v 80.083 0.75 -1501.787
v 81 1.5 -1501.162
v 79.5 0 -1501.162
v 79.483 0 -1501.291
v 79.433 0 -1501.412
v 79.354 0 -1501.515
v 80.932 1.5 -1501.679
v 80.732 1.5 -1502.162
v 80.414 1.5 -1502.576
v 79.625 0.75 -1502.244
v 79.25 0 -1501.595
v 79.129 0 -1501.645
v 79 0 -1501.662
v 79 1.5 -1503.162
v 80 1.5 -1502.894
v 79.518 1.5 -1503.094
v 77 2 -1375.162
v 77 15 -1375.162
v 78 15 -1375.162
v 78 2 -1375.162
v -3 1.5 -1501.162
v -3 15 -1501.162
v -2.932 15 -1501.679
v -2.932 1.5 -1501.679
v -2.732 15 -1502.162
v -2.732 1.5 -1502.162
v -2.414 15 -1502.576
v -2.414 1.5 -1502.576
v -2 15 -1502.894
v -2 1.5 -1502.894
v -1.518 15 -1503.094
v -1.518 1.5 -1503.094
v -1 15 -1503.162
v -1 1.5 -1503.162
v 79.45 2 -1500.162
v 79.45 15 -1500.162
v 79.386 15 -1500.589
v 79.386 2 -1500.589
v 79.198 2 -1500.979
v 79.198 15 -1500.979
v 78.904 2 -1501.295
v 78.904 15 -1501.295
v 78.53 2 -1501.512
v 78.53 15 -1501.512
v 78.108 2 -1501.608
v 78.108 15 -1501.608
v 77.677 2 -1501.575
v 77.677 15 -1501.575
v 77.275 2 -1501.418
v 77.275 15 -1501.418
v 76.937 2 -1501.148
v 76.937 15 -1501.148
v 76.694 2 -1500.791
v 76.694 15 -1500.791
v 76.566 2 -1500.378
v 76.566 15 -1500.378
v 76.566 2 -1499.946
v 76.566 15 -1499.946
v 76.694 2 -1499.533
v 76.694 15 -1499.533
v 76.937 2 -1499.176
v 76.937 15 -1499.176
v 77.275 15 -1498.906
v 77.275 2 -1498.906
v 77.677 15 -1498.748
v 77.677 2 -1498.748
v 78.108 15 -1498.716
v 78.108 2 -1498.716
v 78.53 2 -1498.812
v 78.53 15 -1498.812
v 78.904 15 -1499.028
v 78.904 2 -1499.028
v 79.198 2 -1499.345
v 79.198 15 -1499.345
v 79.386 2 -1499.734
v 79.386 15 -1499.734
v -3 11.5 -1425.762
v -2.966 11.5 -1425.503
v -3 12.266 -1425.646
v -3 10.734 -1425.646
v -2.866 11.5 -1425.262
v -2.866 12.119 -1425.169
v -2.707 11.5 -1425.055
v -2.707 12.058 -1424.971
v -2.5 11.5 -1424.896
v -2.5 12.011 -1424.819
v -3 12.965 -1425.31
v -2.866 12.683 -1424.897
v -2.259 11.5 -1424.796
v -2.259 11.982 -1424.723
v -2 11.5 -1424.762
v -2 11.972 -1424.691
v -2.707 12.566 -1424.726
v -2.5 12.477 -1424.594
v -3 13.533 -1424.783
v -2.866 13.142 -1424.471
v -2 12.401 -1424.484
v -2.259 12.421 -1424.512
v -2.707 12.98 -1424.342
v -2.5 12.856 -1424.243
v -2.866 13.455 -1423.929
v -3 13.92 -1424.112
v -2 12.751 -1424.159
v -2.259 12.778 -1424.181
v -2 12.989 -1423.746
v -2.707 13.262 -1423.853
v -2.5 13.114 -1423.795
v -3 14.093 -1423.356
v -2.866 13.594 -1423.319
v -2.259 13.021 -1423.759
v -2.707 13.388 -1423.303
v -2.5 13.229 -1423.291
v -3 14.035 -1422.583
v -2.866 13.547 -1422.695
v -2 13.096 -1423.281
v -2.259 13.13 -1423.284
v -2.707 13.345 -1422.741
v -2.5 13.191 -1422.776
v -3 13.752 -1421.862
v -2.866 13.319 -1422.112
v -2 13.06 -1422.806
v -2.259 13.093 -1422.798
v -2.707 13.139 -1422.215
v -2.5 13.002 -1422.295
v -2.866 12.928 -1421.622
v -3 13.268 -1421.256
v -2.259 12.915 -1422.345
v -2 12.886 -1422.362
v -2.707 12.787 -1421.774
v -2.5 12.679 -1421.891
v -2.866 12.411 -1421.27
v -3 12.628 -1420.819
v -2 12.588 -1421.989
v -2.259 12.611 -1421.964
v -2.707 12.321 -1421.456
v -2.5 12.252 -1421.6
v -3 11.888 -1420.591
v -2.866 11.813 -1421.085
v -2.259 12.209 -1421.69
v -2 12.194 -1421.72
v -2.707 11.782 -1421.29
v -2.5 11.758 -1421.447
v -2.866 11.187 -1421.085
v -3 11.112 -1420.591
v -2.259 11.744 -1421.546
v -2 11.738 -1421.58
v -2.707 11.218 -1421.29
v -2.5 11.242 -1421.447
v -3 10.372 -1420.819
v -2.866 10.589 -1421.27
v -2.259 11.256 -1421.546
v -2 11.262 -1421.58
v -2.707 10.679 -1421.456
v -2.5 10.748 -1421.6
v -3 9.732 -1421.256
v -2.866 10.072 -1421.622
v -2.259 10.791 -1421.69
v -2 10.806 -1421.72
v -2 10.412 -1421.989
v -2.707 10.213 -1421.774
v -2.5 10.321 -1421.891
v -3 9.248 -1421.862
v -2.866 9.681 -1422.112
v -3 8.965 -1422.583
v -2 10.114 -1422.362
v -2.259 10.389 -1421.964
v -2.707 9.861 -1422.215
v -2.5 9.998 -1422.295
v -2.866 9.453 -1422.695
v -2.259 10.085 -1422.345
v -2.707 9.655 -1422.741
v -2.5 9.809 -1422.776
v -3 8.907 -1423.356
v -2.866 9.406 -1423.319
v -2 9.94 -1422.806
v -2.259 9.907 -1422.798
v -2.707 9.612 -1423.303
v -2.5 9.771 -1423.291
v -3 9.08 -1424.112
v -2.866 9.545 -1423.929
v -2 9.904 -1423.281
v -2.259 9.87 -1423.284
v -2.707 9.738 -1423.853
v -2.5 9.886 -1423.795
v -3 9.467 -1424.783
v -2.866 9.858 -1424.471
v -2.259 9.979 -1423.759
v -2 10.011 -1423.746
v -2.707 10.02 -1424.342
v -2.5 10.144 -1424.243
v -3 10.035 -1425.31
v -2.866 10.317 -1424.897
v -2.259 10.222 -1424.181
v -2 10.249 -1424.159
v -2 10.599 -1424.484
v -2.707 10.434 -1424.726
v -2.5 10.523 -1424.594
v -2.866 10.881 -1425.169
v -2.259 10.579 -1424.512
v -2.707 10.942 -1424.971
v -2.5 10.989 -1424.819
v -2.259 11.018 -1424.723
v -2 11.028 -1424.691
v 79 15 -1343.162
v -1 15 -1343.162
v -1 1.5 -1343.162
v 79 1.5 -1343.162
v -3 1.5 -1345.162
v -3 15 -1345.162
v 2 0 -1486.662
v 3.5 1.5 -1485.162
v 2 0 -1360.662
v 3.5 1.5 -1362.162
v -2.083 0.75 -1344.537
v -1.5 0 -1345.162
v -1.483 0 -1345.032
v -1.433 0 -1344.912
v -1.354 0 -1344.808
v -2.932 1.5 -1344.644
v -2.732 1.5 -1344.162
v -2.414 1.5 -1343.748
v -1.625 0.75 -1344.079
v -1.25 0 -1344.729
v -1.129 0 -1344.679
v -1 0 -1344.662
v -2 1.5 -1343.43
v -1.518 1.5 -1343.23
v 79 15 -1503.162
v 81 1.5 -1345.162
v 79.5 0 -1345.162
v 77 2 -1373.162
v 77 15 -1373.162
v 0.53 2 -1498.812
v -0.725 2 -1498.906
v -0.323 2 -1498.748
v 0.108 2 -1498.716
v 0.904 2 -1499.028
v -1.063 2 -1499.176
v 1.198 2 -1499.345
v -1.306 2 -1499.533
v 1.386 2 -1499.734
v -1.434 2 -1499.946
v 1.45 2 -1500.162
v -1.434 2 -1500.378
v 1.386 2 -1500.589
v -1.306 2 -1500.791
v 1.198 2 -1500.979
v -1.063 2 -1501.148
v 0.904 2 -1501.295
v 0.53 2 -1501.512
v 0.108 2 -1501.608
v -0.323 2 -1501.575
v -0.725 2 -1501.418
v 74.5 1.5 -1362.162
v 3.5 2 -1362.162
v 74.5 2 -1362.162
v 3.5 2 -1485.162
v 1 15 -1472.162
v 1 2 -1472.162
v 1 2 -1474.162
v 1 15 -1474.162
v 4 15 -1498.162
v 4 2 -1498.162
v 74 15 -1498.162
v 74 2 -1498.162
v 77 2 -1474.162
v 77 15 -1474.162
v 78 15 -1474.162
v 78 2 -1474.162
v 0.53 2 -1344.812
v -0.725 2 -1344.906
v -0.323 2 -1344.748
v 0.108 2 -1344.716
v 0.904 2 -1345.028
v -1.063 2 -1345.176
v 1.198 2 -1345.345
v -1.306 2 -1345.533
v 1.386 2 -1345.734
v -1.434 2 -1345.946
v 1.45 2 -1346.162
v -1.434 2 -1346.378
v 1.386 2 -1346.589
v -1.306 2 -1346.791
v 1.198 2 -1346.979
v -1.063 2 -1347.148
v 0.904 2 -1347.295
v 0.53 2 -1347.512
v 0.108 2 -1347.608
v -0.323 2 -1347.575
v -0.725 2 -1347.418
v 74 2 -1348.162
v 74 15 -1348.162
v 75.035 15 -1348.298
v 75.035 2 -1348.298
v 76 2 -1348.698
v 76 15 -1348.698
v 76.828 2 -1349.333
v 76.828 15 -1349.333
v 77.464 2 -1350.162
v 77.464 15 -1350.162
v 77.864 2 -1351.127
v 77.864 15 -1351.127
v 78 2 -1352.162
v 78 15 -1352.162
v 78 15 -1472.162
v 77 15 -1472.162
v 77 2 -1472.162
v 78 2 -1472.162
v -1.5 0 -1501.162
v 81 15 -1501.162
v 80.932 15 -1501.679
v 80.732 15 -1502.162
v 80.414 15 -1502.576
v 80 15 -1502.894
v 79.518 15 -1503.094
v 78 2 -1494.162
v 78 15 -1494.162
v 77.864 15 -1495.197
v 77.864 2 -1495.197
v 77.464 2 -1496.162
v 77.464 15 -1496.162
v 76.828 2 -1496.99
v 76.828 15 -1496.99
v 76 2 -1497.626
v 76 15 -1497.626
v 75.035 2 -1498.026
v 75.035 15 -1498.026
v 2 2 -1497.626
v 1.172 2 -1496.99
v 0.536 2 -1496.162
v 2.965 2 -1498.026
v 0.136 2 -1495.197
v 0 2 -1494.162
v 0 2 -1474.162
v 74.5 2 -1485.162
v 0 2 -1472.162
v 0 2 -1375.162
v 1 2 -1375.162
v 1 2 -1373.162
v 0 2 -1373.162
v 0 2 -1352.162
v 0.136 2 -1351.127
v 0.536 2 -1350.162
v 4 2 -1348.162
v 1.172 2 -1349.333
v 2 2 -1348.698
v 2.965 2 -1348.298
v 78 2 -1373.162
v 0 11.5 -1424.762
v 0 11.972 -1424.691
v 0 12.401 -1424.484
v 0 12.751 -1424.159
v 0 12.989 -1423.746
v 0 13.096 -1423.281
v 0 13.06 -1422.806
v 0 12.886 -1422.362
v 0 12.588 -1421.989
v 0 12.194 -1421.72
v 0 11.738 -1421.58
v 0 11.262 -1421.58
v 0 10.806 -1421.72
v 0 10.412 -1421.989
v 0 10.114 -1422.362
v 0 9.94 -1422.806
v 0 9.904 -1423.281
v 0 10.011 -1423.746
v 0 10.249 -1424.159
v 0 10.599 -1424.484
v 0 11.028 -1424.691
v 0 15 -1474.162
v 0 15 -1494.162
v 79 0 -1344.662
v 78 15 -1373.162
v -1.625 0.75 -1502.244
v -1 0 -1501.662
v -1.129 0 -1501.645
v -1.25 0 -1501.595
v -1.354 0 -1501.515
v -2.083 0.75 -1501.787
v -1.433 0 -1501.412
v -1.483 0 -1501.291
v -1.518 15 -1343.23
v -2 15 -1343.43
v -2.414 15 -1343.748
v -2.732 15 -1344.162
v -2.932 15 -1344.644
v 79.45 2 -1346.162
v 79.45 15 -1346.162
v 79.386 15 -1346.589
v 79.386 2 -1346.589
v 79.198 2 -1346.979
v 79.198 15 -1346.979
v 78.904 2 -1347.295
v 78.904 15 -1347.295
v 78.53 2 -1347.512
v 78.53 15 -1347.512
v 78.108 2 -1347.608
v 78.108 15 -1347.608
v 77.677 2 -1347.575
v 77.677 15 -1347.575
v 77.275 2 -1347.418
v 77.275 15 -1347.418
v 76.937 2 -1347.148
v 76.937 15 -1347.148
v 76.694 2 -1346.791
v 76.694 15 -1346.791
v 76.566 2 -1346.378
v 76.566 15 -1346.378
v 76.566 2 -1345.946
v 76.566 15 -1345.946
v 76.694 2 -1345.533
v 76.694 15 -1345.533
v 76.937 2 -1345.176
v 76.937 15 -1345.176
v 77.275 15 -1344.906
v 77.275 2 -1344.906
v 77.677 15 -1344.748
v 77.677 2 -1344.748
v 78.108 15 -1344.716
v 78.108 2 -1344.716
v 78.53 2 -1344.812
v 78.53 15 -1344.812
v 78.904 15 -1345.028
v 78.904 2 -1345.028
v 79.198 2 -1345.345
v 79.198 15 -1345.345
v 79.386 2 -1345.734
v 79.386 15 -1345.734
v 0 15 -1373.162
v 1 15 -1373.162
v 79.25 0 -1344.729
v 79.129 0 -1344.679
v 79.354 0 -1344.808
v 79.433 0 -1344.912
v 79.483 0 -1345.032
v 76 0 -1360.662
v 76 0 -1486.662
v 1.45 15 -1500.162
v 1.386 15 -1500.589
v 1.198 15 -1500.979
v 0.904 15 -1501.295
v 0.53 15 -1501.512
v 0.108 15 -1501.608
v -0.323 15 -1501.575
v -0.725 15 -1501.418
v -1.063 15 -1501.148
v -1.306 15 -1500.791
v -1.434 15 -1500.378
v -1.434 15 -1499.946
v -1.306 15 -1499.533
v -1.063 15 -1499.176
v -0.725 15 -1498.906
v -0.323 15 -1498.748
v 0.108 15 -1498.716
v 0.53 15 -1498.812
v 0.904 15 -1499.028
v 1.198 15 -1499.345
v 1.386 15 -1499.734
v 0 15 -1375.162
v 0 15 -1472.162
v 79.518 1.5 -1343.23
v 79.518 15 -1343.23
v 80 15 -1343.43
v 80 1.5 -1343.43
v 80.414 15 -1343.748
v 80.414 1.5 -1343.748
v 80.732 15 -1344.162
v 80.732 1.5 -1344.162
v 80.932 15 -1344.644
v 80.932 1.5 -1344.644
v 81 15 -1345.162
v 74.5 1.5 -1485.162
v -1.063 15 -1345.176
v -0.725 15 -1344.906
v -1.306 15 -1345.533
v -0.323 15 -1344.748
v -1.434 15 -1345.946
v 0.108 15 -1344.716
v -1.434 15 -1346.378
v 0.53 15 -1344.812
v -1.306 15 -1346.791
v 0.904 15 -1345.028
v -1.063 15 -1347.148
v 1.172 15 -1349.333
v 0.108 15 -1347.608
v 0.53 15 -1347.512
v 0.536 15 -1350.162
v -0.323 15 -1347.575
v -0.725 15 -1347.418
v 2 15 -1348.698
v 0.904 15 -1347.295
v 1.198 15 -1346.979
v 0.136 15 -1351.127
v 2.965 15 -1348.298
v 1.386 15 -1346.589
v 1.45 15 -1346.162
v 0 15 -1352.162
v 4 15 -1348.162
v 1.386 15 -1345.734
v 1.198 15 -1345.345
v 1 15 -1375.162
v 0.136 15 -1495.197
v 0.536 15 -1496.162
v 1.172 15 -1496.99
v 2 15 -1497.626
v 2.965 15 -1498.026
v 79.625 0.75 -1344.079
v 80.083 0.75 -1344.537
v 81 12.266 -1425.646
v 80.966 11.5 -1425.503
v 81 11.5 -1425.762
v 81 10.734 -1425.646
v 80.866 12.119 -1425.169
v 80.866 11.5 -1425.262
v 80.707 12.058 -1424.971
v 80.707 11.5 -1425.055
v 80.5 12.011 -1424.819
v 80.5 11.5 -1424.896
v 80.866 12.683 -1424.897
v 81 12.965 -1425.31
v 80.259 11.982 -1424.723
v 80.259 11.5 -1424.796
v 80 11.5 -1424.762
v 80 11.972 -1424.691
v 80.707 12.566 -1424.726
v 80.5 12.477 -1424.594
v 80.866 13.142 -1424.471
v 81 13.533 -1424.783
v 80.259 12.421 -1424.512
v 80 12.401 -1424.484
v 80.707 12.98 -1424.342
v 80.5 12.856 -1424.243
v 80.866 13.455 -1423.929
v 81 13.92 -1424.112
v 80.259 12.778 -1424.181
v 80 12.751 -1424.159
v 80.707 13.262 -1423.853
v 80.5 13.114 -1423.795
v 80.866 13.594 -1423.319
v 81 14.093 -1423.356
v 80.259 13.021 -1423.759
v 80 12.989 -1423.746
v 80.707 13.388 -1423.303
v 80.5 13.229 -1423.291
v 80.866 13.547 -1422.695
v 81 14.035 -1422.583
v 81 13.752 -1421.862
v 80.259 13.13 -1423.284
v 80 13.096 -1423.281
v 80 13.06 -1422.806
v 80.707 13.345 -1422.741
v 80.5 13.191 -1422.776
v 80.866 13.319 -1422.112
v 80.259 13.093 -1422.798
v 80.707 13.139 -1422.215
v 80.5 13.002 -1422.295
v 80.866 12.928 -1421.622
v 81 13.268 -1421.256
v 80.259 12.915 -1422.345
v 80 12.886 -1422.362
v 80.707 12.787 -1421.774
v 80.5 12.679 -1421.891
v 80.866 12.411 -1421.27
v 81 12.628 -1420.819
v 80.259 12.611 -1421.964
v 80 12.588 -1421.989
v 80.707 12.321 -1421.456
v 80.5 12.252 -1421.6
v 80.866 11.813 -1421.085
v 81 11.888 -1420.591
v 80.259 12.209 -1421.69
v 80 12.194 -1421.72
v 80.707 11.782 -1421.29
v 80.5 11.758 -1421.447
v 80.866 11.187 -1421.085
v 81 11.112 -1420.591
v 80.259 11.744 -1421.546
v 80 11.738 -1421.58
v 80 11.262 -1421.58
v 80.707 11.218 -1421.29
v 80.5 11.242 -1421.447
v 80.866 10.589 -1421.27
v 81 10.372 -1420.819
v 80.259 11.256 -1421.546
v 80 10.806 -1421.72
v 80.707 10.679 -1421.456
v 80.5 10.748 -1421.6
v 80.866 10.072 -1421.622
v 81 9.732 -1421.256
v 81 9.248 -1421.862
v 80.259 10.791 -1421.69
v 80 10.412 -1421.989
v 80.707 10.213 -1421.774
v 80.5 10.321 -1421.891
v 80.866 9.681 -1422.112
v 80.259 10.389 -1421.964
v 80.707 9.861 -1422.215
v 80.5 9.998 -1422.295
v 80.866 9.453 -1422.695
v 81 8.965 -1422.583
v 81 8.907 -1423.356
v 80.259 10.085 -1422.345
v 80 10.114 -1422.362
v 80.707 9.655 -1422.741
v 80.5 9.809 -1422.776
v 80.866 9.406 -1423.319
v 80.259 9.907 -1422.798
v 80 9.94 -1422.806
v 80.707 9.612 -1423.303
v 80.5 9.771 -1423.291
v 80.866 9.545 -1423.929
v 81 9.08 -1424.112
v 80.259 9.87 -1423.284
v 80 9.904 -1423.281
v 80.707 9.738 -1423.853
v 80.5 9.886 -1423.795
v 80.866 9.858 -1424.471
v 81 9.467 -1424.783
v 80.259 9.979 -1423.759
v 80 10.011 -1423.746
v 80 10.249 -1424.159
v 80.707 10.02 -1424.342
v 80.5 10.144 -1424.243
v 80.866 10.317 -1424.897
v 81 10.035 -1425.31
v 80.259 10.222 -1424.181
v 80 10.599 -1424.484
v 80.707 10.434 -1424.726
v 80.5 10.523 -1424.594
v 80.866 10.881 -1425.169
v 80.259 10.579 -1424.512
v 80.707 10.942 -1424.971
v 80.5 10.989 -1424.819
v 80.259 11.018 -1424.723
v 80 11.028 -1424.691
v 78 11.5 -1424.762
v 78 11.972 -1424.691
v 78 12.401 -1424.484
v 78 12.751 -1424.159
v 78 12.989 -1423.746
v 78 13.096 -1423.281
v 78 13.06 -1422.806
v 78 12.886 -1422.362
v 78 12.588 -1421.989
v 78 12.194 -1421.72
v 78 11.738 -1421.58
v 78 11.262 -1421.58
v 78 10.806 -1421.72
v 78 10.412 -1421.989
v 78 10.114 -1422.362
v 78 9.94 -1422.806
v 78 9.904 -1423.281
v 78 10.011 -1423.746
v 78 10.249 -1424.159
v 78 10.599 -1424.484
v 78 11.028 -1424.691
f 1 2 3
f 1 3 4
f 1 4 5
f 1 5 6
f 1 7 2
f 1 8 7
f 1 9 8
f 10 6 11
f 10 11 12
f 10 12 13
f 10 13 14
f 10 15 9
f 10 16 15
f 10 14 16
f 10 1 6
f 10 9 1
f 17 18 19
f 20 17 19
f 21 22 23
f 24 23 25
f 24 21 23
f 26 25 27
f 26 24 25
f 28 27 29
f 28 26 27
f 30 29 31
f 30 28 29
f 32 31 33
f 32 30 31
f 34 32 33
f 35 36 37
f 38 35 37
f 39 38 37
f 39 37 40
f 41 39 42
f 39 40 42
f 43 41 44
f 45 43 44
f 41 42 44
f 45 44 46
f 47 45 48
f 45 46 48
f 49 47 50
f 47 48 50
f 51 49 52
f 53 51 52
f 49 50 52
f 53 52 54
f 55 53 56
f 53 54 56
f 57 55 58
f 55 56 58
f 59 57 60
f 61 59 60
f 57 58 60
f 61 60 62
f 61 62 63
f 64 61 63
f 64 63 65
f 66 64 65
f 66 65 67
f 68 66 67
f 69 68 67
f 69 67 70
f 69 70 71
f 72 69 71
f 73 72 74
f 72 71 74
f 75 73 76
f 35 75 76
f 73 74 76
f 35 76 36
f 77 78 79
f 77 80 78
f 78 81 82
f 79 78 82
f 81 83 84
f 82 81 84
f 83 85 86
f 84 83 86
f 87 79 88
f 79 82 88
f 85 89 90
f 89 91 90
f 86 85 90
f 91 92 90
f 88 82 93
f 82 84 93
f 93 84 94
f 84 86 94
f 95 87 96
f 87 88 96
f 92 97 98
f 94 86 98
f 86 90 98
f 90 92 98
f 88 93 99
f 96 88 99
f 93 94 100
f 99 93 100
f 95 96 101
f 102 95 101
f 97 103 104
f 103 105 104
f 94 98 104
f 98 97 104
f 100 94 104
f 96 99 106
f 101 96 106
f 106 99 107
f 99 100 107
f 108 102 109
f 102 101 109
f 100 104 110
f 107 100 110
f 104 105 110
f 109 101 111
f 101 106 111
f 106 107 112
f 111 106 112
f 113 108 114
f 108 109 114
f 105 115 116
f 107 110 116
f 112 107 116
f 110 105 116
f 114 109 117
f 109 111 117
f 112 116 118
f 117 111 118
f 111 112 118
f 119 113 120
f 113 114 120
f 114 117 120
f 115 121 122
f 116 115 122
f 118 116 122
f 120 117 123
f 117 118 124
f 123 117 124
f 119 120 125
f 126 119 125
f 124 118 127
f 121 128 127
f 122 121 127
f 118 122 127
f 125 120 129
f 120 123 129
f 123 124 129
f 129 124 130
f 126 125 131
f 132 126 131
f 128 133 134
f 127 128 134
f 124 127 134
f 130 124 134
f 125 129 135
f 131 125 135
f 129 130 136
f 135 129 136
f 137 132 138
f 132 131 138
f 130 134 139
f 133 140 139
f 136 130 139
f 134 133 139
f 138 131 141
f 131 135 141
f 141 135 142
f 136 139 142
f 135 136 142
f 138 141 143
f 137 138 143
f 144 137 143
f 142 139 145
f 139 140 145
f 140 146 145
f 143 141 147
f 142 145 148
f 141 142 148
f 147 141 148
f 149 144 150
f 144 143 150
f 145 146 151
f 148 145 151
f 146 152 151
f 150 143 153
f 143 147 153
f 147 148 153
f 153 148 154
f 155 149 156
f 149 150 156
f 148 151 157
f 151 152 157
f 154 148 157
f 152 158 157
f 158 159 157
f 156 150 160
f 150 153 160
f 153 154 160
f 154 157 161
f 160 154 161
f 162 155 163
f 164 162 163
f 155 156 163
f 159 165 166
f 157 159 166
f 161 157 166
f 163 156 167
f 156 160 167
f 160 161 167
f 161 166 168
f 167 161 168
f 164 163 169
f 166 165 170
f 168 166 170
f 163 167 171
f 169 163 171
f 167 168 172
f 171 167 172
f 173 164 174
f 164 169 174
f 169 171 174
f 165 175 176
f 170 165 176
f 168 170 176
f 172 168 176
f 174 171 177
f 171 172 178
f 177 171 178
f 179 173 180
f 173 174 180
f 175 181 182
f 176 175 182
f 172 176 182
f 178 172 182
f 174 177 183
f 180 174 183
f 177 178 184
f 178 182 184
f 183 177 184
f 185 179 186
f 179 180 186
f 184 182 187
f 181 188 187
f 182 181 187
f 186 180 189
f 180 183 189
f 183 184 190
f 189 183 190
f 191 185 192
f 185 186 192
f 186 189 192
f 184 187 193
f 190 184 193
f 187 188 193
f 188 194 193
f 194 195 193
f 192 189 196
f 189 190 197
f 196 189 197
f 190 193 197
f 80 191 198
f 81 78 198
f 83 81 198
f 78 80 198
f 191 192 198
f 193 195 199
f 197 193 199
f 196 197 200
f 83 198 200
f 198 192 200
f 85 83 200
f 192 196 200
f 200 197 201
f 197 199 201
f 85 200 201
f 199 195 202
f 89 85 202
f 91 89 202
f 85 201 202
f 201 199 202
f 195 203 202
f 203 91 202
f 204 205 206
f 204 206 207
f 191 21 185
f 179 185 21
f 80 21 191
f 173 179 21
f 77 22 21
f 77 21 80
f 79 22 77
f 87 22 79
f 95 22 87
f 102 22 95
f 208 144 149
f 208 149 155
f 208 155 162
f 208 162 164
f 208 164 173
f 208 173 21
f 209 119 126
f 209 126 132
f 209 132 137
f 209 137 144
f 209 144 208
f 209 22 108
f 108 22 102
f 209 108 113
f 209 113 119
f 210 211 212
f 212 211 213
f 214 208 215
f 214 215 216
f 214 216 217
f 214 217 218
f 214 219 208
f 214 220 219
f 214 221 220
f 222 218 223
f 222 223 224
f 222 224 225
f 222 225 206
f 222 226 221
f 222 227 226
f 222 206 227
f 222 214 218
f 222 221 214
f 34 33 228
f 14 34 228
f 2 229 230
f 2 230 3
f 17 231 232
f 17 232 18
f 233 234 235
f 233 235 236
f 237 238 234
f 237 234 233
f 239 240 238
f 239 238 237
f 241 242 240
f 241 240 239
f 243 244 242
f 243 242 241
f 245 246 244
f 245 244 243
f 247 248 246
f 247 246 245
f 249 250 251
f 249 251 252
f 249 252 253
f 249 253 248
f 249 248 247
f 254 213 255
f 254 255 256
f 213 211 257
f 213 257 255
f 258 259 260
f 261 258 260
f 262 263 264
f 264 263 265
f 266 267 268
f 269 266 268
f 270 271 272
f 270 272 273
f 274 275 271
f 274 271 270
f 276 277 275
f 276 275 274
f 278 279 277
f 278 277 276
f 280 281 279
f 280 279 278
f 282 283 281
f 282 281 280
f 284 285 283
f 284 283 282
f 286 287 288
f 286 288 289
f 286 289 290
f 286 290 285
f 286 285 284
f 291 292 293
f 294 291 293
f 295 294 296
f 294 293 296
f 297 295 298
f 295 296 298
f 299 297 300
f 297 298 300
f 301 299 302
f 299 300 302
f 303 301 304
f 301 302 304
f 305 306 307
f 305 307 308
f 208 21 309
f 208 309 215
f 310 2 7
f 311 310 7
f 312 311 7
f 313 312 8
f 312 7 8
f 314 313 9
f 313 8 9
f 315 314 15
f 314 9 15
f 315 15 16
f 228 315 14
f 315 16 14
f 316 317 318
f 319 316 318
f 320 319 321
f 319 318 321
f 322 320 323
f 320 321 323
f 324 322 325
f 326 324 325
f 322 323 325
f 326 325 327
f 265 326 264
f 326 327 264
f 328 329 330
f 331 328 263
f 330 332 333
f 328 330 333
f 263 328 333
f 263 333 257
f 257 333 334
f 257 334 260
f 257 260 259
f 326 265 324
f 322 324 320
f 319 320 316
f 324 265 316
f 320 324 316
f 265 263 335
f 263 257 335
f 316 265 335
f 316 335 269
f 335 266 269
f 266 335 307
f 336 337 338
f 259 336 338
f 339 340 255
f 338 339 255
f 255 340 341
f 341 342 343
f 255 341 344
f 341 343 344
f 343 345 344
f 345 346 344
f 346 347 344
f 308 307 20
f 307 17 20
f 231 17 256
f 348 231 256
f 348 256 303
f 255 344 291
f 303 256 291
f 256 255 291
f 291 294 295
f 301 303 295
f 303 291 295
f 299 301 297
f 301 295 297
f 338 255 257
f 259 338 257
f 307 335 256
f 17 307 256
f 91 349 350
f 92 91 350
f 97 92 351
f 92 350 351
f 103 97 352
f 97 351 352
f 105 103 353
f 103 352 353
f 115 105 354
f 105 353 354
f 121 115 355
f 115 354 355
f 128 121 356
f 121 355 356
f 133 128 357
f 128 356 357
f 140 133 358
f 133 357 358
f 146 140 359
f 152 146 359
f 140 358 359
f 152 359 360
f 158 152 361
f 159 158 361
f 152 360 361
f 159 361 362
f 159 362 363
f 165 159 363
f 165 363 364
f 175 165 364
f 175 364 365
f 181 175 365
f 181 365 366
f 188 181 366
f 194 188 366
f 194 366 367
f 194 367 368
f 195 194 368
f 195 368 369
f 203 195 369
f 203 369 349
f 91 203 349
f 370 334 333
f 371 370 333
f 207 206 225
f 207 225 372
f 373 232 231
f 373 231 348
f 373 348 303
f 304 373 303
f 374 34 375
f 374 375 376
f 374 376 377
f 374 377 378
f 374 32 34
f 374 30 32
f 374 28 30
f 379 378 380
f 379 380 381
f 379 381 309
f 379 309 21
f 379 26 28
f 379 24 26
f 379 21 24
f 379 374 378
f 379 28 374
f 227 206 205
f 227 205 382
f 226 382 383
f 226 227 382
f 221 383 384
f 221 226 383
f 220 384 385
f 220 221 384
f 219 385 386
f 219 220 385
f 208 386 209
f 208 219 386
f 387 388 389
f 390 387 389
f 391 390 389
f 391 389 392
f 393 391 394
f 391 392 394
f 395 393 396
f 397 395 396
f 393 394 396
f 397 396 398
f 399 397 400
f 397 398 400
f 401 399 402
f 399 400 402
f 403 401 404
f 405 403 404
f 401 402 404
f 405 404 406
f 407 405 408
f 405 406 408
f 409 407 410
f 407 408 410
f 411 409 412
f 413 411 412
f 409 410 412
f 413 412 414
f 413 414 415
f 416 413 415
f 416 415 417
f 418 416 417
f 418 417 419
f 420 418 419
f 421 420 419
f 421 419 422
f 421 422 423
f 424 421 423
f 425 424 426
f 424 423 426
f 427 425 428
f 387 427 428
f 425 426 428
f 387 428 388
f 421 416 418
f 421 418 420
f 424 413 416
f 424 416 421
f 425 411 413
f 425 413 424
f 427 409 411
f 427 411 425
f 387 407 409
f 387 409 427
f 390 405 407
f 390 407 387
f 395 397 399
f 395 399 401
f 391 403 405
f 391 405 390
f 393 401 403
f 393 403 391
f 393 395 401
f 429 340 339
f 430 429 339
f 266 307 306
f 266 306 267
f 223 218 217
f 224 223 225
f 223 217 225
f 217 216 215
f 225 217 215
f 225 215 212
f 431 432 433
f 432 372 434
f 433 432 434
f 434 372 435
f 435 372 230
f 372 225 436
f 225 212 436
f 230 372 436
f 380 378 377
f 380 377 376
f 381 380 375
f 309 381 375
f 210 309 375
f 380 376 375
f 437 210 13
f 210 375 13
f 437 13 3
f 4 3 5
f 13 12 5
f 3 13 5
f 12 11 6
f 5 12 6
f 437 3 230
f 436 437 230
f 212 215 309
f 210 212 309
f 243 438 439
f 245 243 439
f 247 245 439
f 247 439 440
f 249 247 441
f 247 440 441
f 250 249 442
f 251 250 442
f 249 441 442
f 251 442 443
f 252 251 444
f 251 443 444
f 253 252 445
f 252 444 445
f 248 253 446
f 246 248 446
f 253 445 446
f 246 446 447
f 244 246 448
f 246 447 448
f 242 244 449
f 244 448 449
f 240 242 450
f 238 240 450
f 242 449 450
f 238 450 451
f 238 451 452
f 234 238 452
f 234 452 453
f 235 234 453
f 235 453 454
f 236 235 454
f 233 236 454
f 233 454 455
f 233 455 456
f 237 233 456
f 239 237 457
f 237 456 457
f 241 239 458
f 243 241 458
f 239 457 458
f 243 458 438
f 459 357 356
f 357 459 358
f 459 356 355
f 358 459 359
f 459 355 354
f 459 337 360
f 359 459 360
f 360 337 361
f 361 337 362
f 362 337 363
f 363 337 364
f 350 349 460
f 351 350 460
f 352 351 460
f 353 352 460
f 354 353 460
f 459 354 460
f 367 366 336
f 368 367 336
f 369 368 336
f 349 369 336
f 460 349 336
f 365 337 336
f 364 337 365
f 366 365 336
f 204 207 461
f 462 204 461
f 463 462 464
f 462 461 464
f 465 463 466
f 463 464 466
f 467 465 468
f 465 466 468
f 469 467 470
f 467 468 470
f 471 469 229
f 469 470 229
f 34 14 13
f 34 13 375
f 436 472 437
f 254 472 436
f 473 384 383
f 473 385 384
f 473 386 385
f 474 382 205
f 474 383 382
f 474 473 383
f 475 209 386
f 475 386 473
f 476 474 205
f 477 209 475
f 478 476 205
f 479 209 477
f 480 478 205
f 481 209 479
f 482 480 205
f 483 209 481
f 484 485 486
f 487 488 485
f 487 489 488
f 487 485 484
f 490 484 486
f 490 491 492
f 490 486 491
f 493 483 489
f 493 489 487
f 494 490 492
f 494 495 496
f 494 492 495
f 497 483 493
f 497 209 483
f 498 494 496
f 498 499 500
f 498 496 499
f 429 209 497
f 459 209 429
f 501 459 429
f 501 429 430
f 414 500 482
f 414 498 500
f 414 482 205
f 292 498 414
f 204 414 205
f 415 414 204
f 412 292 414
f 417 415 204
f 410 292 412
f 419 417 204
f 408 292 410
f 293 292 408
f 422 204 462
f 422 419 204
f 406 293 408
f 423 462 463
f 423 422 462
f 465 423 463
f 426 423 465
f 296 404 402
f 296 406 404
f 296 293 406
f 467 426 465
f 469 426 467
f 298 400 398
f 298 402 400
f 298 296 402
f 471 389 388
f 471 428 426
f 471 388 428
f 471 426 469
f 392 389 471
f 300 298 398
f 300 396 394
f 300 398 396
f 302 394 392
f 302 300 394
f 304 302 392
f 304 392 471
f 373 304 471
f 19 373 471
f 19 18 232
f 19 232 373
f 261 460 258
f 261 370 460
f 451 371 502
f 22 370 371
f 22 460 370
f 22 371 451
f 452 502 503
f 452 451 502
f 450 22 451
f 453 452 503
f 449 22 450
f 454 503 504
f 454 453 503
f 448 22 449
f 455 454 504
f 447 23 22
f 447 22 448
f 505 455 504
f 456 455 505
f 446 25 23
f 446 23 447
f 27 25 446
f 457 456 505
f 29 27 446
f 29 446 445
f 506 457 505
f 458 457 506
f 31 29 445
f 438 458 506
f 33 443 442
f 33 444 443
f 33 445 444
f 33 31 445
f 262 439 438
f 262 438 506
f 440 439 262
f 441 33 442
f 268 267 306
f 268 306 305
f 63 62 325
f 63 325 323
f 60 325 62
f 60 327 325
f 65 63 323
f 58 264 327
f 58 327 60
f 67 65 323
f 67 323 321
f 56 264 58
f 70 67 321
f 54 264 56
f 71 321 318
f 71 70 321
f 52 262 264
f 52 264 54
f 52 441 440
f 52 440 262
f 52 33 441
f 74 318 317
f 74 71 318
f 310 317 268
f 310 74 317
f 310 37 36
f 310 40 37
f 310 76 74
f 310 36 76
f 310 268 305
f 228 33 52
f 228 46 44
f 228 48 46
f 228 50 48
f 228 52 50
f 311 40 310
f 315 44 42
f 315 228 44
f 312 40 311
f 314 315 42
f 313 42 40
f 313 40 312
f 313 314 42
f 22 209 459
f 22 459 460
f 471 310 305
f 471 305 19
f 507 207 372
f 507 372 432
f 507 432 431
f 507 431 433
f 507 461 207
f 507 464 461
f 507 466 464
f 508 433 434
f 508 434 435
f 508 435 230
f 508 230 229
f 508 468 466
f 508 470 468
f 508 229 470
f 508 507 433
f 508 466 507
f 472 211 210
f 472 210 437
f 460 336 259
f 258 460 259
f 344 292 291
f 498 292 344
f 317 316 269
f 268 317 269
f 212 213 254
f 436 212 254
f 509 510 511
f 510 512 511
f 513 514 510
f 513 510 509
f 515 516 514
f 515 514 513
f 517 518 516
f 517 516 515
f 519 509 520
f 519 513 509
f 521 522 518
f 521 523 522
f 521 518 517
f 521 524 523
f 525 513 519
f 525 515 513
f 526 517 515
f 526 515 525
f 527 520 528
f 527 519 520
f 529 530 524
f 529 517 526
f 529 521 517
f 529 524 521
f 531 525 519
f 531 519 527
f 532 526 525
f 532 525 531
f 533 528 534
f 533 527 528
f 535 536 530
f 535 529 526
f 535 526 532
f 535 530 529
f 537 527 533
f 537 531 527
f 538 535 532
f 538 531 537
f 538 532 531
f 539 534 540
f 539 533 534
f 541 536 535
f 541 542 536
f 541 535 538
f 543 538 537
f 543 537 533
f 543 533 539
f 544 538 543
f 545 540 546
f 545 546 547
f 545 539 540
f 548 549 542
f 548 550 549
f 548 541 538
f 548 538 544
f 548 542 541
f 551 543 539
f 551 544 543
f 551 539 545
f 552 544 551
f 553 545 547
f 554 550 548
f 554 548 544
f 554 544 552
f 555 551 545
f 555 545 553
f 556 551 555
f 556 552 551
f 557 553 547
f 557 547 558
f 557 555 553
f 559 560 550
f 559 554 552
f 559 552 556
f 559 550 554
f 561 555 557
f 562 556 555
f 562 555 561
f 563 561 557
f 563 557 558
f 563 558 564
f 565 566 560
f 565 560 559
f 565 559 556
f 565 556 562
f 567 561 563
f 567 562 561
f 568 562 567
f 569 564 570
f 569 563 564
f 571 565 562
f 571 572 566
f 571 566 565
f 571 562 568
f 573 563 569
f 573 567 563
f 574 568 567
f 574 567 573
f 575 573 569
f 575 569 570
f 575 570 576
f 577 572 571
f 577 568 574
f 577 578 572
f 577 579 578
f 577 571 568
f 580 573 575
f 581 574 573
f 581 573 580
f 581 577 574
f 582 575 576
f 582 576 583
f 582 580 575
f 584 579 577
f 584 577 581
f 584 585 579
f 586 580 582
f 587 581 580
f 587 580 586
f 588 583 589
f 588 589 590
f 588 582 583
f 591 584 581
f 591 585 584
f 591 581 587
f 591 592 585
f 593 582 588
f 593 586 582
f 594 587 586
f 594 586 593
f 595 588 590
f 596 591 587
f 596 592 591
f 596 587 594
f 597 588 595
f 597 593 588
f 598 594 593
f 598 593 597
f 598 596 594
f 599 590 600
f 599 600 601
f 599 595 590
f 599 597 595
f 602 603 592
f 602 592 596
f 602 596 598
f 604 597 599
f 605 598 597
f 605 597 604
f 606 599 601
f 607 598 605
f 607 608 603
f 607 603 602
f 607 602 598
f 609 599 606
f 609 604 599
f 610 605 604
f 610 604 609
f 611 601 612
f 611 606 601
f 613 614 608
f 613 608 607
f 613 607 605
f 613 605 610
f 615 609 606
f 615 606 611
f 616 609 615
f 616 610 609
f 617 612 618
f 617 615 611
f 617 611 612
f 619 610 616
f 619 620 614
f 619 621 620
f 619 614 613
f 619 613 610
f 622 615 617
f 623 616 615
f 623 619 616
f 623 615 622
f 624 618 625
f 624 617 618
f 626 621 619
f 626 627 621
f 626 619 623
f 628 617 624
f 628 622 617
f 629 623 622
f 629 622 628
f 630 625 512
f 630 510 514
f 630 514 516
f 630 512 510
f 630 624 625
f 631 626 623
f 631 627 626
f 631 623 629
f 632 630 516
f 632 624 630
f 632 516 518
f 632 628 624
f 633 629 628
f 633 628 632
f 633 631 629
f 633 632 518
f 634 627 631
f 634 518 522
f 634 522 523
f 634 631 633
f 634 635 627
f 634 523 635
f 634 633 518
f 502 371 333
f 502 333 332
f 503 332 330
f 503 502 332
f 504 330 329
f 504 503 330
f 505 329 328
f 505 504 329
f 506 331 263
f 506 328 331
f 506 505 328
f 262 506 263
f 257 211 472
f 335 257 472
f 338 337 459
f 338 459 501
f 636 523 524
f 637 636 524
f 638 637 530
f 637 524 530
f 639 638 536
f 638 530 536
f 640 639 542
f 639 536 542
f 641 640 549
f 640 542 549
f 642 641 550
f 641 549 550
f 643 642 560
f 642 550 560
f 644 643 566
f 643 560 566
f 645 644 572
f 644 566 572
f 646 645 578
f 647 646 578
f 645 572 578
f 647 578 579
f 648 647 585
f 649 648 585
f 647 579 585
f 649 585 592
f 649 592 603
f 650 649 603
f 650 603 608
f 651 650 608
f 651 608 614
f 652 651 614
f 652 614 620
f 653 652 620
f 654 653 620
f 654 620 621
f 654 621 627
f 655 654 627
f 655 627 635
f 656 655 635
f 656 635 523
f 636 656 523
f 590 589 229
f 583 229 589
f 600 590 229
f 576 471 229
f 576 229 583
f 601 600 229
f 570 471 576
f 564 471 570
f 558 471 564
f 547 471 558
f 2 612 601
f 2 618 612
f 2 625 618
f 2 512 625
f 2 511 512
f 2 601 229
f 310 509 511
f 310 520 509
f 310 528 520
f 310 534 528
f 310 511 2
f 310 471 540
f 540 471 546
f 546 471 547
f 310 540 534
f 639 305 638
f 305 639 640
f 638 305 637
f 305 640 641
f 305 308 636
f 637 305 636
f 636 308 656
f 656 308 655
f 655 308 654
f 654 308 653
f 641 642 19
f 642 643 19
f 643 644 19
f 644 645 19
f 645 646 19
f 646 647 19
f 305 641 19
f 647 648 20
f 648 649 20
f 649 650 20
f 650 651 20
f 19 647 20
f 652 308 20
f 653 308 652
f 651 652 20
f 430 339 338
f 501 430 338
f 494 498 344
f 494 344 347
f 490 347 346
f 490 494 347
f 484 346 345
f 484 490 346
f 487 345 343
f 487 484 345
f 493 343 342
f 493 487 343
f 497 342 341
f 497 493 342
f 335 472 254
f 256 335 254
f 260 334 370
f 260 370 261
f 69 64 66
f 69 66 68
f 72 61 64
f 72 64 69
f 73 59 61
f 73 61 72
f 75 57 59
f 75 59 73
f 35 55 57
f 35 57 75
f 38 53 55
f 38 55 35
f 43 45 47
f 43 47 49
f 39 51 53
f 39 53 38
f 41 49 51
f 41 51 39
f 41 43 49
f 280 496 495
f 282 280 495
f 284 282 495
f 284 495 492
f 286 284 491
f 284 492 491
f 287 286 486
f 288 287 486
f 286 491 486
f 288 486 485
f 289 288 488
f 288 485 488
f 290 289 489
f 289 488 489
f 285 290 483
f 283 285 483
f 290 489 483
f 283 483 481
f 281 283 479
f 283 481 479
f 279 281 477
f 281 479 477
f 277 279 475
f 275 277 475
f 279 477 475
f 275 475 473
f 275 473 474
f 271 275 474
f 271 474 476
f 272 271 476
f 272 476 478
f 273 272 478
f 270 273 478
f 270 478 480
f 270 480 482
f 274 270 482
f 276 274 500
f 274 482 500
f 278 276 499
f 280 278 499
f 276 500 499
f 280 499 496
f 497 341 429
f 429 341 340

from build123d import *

# Parameters (mm, degrees)
EXTRUDE_2_DEPTH     = 15
FILLET_1_R          = 2
FILLET_2_R          = 2
FILLET_3_R          = 4
FILLET_4_R          = 4
EXTRUDE_3_DEPTH     = 15
FILLET_5_R          = 2
SKETCH_5_R          = 1.45
CUT_EXTRUDE_1_DEPTH = 10
EXTRUDE_4_DEPTH     = 2
SKETCH_9_R          = 1.6
CUT_EXTRUDE_3_DEPTH = 84
FILLET_6_R          = 1
FILLET_7_R          = 1
SKETCH_10_W         = 78
SKETCH_10_H         = 128
SKETCH_10_W_2       = 71
SKETCH_10_H_2       = 123
EXTRUDE_5_DEPTH     = 2
SKETCH_11_W         = 1
SKETCH_11_H         = 2
EXTRUDE_6_DEPTH     = 13
SKETCH_13_R         = 2.45
EXTRUDE_8_DEPTH     = 13
SKETCH_14_W         = 62.39543454
SKETCH_14_H         = 37.793362071
SKETCH_14_H_2       = 37.79336207
CUT_EXTRUDE_4_DEPTH = 15
EXTRUDE_9_DEPTH     = 15
SKETCH_16_R         = 1.45
CUT_EXTRUDE_5_DEPTH = 13
FILLET_8_R          = 2
CHAMFER_1_SIZE      = 1.5


with BuildPart() as part:
    # 草图3 → 凸台-拉伸2 (new body)
    with BuildSketch(Plane(origin=(0, 0, 0), x_dir=(1, 0, 0), z_dir=(0, 1, 0))):
        Polygon((-3, 1345.161797484), (-3, 1501.161797484), (17.145898034, 1501.161797484), (27.145898034, 1521.161797484), (50.854101966, 1521.161797484), (60.854101966, 1501.161797484), (81, 1501.161797484), (81, 1345.161797484), (60.854101966, 1345.161797484), (50.854101966, 1325.161797484), (27.145898034, 1325.161797484), (17.145898034, 1345.161797484), align=None)
        Polygon((49, 1518.161797484), (59, 1498.161797484), (78, 1498.161797484), (78, 1348.161797484), (59, 1348.161797484), (49, 1328.161797484), (29, 1328.161797484), (19, 1348.161797484), (0, 1348.161797484), (0, 1498.161797484), (19, 1498.161797484), (29, 1518.161797484), align=None, mode=Mode.SUBTRACT)
    extrude(amount=EXTRUDE_2_DEPTH)

    # 圆角1
    fillet_1_edges = [part.edges().sort_by_distance(p)[0] for p in [
        (49, 7.5, -1518.161797484),
        (29, 7.5, -1518.161797484),
        (19, 7.5, -1498.161797484),
        (59, 7.5, -1498.161797484),
        (17.145898034, 7.5, -1501.161797484),
        (27.145898034, 7.5, -1521.161797484),
        (50.854101966, 7.5, -1521.161797484),
        (60.854101966, 7.5, -1501.161797484),
    ]]
    fillet(fillet_1_edges, radius=FILLET_1_R)

    # 圆角2
    fillet_2_edges = [part.edges().sort_by_distance(p)[0] for p in [
        (19, 7.5, -1348.161797484),
        (29, 7.5, -1328.161797484),
        (49, 7.5, -1328.161797484),
        (59, 7.5, -1348.161797484),
        (60.854101966, 7.5, -1345.161797484),
        (50.854101966, 7.5, -1325.161797484),
        (27.145898034, 7.5, -1325.161797484),
        (17.145898034, 7.5, -1345.161797484),
    ]]
    fillet(fillet_2_edges, radius=FILLET_2_R)

    # 圆角3
    fillet_3_edges = [part.edges().sort_by_distance(p)[0] for p in [
        (-3, 7.5, -1501.161797484),
        (81, 7.5, -1501.161797484),
        (81, 7.5, -1345.161797484),
        (-3, 7.5, -1345.161797484),
    ]]
    fillet(fillet_3_edges, radius=FILLET_3_R)

    # 圆角4
    fillet_4_edges = [part.edges().sort_by_distance(p)[0] for p in [
        (0, 7.5, -1498.161797484),
        (0, 7.5, -1348.161797484),
        (78, 7.5, -1348.161797484),
        (78, 7.5, -1498.161797484),
    ]]
    fillet(fillet_4_edges, radius=FILLET_4_R)

    # 草图4 → 凸台-拉伸3 (add)
    with BuildSketch(Plane(origin=(0, 15, 0), x_dir=(1, 0, 0), z_dir=(0, 1, 0))):
        with BuildLine():
            Line((8.454915028, 1345.161797484), (22.145898034, 1335.161797484))
            Line((22.145898034, 1335.161797484), (17.698684438, 1344.056224675))
            ThreePointArc((17.698684438, 1344.056224675), (16.96129228, 1344.8630991), (15.909830056, 1345.161797484))
            Line((15.909830056, 1345.161797484), (8.454915028, 1345.161797484))
        make_face()
        with BuildLine():
            Line((69.545084972, 1345.161797484), (62.090169944, 1345.161797484))
            ThreePointArc((62.090169944, 1345.161797484), (61.03870772, 1344.8630991), (60.301315562, 1344.056224675))
            Line((60.301315562, 1344.056224675), (55.854101966, 1335.161797484))
            Line((55.854101966, 1335.161797484), (69.545084972, 1345.161797484))
        make_face()
        with BuildLine():
            Line((69.545084972, 1501.161797484), (55.854101966, 1511.161797484))
            Line((55.854101966, 1511.161797484), (60.301315562, 1502.267370293))
            ThreePointArc((60.301315562, 1502.267370293), (61.03870772, 1501.460495867), (62.090169944, 1501.161797484))
            Line((62.090169944, 1501.161797484), (69.545084972, 1501.161797484))
        make_face()
        with BuildLine():
            Line((8.454915028, 1501.161797484), (15.909830056, 1501.161797484))
            ThreePointArc((15.909830056, 1501.161797484), (16.96129228, 1501.460495867), (17.698684438, 1502.267370293))
            Line((17.698684438, 1502.267370293), (22.145898034, 1511.161797484))
            Line((22.145898034, 1511.161797484), (8.454915028, 1501.161797484))
        make_face()
    extrude(amount=-EXTRUDE_3_DEPTH)

    # 圆角5
    fillet_5_edges = [part.edges().sort_by_distance(p)[0] for p in [
        (8.454915028, 7.5, -1345.161797484),
        (22.145898034, 7.5, -1335.161797484),
        (69.545084972, 7.5, -1345.161797484),
        (55.854101966, 7.5, -1335.161797484),
        (55.854101966, 7.5, -1511.161797484),
        (69.545084972, 7.5, -1501.161797484),
        (8.454915028, 7.5, -1501.161797484),
        (22.145898034, 7.5, -1511.161797484),
    ]]
    fillet(fillet_5_edges, radius=FILLET_5_R)

    # 草图5 → 切除-拉伸1 (cut)
    with BuildSketch(Plane(origin=(0, 15, 0), x_dir=(1, 0, 0), z_dir=(0, 1, 0))):
        with Locations((16, 1344.661797484)):
            Circle(SKETCH_5_R)
        with Locations((62, 1344.661797484)):
            Circle(SKETCH_5_R)
        with Locations((62, 1501.661797484)):
            Circle(SKETCH_5_R)
        with Locations((16, 1501.661797484)):
            Circle(SKETCH_5_R)
    extrude(amount=-CUT_EXTRUDE_1_DEPTH, mode=Mode.SUBTRACT)

    # 草图6 → 凸台-拉伸4 (add)
    with BuildSketch(Plane.XZ):
        with BuildLine():
            Line((70.19771727, -1501.161797484), (77, -1501.161797484))
            ThreePointArc((77, -1501.161797484), (79.828427125, -1499.990224608), (81, -1497.161797484))
            Line((81, -1497.161797484), (81, -1487.161797484))
            Line((81, -1487.161797484), (-3, -1487.161797484))
            Line((-3, -1487.161797484), (-3, -1497.161797484))
            ThreePointArc((-3, -1497.161797484), (-1.828427125, -1499.990224608), (1, -1501.161797484))
            Line((1, -1501.161797484), (7.80228273, -1501.161797484))
            ThreePointArc((7.80228273, -1501.161797484), (8.422717804, -1501.260466287), (8.981935292, -1501.546737165))
            Line((8.981935292, -1501.546737165), (21.753826871, -1510.875425671))
            ThreePointArc((21.753826871, -1510.875425671), (22.101536871, -1511.199299092), (22.363028691, -1511.596058798))
            Line((22.363028691, -1511.596058798), (26.593111629, -1520.056224675))
            ThreePointArc((26.593111629, -1520.056224675), (27.330503787, -1520.8630991), (28.381966011, -1521.161797484))
            Line((28.381966011, -1521.161797484), (49.618033989, -1521.161797484))
            ThreePointArc((49.618033989, -1521.161797484), (50.669496213, -1520.8630991), (51.406888371, -1520.056224675))
            Line((51.406888371, -1520.056224675), (55.636971309, -1511.596058798))
            ThreePointArc((55.636971309, -1511.596058798), (55.898463129, -1511.199299092), (56.246173129, -1510.875425671))
            Line((56.246173129, -1510.875425671), (69.018064708, -1501.546737165))
            ThreePointArc((69.018064708, -1501.546737165), (69.577282196, -1501.260466287), (70.19771727, -1501.161797484))
        make_face()
        with BuildLine():
            Line((81, -1349.161797484), (81, -1359.161797484))
            Line((81, -1359.161797484), (-3, -1359.161797484))
            Line((-3, -1359.161797484), (-3, -1349.161797484))
            ThreePointArc((-3, -1349.161797484), (-1.828427125, -1346.333370359), (1, -1345.161797484))
            Line((1, -1345.161797484), (7.80228273, -1345.161797484))
            ThreePointArc((7.80228273, -1345.161797484), (8.422717804, -1345.06312868), (8.981935292, -1344.776857802))
            Line((8.981935292, -1344.776857802), (21.753826871, -1335.448169296))
            ThreePointArc((21.753826871, -1335.448169296), (22.101536871, -1335.124295876), (22.363028691, -1334.727536169))
            Line((22.363028691, -1334.727536169), (26.593111629, -1326.267370293))
            ThreePointArc((26.593111629, -1326.267370293), (27.330503787, -1325.460495867), (28.381966011, -1325.161797484))
            Line((28.381966011, -1325.161797484), (49.618033989, -1325.161797484))
            ThreePointArc((49.618033989, -1325.161797484), (50.669496213, -1325.460495867), (51.406888371, -1326.267370293))
            Line((51.406888371, -1326.267370293), (55.636971309, -1334.727536169))
            ThreePointArc((55.636971309, -1334.727536169), (55.898463129, -1335.124295876), (56.246173129, -1335.448169296))
            Line((56.246173129, -1335.448169296), (69.018064708, -1344.776857802))
            ThreePointArc((69.018064708, -1344.776857802), (69.577282196, -1345.06312868), (70.19771727, -1345.161797484))
            Line((70.19771727, -1345.161797484), (77, -1345.161797484))
            ThreePointArc((77, -1345.161797484), (79.828427125, -1346.333370359), (81, -1349.161797484))
        make_face()
    extrude(amount=-EXTRUDE_4_DEPTH)

    # 草图9 → 切除-拉伸3 (cut)
    with BuildSketch(Plane(origin=(81, 0, 0), x_dir=(0, 0, -1), z_dir=(1, 0, 0))):
        with Locations((1423.161797484, 11.5)):
            Circle(SKETCH_9_R)
    extrude(amount=-CUT_EXTRUDE_3_DEPTH, mode=Mode.SUBTRACT)

    # 圆角6
    fillet_6_edges = [part.edges().sort_by_distance(p)[0] for p in [
        (-3, 11.5, -1421.561797484),
        (81, 11.5, -1421.561797484),
    ]]
    fillet(fillet_6_edges, radius=FILLET_6_R)

    # 圆角7
    fillet_7_edges = [part.edges().sort_by_distance(p)[0] for p in [
        (14.55, 15, -1501.661797484),
        (60.55, 15, -1501.661797484),
        (60.55, 15, -1344.661797484),
        (14.55, 15, -1344.661797484),
    ]]
    fillet(fillet_7_edges, radius=FILLET_7_R)

    # 草图10 → 凸台-拉伸5 (add)
    with BuildSketch(Plane.XZ):
        with Locations((39, -1423.161797484)):
            Rectangle(SKETCH_10_W, SKETCH_10_H)
        with Locations((39, -1423.661797484)):
            Rectangle(SKETCH_10_W_2, SKETCH_10_H_2, mode=Mode.SUBTRACT)
    extrude(amount=-EXTRUDE_5_DEPTH)

    # 草图11 → 凸台-拉伸6 (add)
    with BuildSketch(Plane(origin=(0, 2, 0), x_dir=(1, 0, 0), z_dir=(0, 1, 0))):
        with Locations((77.5, 1374.161797484)):
            Rectangle(SKETCH_11_W, SKETCH_11_H)
        with Locations((0.5, 1374.161797484)):
            Rectangle(SKETCH_11_W, SKETCH_11_H)
        with Locations((0.5, 1473.161797484)):
            Rectangle(SKETCH_11_W, SKETCH_11_H)
        with Locations((77.5, 1473.161797484)):
            Rectangle(SKETCH_11_W, SKETCH_11_H)
    extrude(amount=EXTRUDE_6_DEPTH)

    # 草图13 → 凸台-拉伸8 (add)
    with BuildSketch(Plane(origin=(0, 15, 0), x_dir=(1, 0, 0), z_dir=(0, 1, 0))):
        with Locations((62, 1501.661797484)):
            Circle(SKETCH_13_R)
        with Locations((16, 1501.661797484)):
            Circle(SKETCH_13_R)
        with Locations((62, 1344.661797484)):
            Circle(SKETCH_13_R)
        with Locations((16, 1344.661797484)):
            Circle(SKETCH_13_R)
    extrude(amount=-EXTRUDE_8_DEPTH)

    # 草图14 → 切除-拉伸4 (cut)
    with BuildSketch(Plane(origin=(0, 15, 0), x_dir=(1, 0, 0), z_dir=(0, 1, 0))):
        with Locations((39, 1326.265116449)):
            Rectangle(SKETCH_14_W, SKETCH_14_H)
        with Locations((39, 1520.058478519)):
            Rectangle(SKETCH_14_W, SKETCH_14_H_2)
    extrude(amount=-CUT_EXTRUDE_4_DEPTH, mode=Mode.SUBTRACT)

    # 草图15 → 凸台-拉伸9 (add)
    with BuildSketch(Plane(origin=(0, 15, 0), x_dir=(1, 0, 0), z_dir=(0, 1, 0))):
        Polygon((-3, 1348.161797484), (-3, 1343.161797484), (81, 1343.161797484), (81, 1348.161797484), (81, 1352.401319515), (79.302833031, 1352.401319515), (79.302833031, 1348.161797484), (-0.854989164, 1348.161797484), (-0.854989164, 1353.161797484), (-3, 1353.161797484), align=None)
        Polygon((79.302833031, 1493.922275452), (79.302833031, 1498.161797484), (-0.854989164, 1498.161797484), (-0.854989164, 1493.161797484), (-3, 1493.161797484), (-3, 1498.161797484), (-3, 1503.161797484), (81, 1503.161797484), (81, 1498.161797484), (81, 1493.922275452), align=None)
    extrude(amount=-EXTRUDE_9_DEPTH)

    # 草图16 → 切除-拉伸5 (cut)
    with BuildSketch(Plane(origin=(0, 15, 0), x_dir=(1, 0, 0), z_dir=(0, 1, 0))):
        with Locations((0, 1346.161797484)):
            Circle(SKETCH_16_R)
        with Locations((0, 1500.161797484)):
            Circle(SKETCH_16_R)
        with Locations((78, 1500.161797484)):
            Circle(SKETCH_16_R)
        with Locations((78, 1346.161797484)):
            Circle(SKETCH_16_R)
    extrude(amount=-CUT_EXTRUDE_5_DEPTH, mode=Mode.SUBTRACT)

    # 圆角8
    fillet_8_edges = [part.edges().sort_by_distance(p)[0] for p in [
        (81, 7.5, -1343.161797484),
        (-3, 7.5, -1343.161797484),
        (-3, 7.5, -1503.161797484),
        (81, 7.5, -1503.161797484),
    ]]
    fillet(fillet_8_edges, radius=FILLET_8_R)

    # 倒角1
    chamfer_1_edges = [part.edges().sort_by_distance(p)[0] for p in [
        (74.5, 0, -1423.661797484),
        (39, 0, -1485.161797484),
        (3.5, 0, -1423.661797484),
        (39, 0, -1362.161797484),
        (81, 0, -1423.161797484),
        (39, 0, -1503.161797484),
        (39, 0, -1343.161797484),
        (-3, 0, -1423.161797484),
        (80.414213562, 0, -1343.747583921),
        (-2.414213562, 0, -1343.747583921),
        (-2.414213562, 0, -1502.576011046),
        (80.414213562, 0, -1502.576011046),
    ]]
    chamfer(chamfer_1_edges, length=CHAMFER_1_SIZE)


solid = part.part
